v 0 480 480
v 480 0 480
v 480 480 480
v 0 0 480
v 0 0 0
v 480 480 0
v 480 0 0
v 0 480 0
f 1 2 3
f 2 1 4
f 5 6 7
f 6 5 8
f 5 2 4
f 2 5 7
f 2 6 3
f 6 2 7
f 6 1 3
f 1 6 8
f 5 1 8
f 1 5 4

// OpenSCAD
module domain(size=[480,480,480], offest=[0,0,0]){
    translate(offest)cube(size, false);
}

domain();
